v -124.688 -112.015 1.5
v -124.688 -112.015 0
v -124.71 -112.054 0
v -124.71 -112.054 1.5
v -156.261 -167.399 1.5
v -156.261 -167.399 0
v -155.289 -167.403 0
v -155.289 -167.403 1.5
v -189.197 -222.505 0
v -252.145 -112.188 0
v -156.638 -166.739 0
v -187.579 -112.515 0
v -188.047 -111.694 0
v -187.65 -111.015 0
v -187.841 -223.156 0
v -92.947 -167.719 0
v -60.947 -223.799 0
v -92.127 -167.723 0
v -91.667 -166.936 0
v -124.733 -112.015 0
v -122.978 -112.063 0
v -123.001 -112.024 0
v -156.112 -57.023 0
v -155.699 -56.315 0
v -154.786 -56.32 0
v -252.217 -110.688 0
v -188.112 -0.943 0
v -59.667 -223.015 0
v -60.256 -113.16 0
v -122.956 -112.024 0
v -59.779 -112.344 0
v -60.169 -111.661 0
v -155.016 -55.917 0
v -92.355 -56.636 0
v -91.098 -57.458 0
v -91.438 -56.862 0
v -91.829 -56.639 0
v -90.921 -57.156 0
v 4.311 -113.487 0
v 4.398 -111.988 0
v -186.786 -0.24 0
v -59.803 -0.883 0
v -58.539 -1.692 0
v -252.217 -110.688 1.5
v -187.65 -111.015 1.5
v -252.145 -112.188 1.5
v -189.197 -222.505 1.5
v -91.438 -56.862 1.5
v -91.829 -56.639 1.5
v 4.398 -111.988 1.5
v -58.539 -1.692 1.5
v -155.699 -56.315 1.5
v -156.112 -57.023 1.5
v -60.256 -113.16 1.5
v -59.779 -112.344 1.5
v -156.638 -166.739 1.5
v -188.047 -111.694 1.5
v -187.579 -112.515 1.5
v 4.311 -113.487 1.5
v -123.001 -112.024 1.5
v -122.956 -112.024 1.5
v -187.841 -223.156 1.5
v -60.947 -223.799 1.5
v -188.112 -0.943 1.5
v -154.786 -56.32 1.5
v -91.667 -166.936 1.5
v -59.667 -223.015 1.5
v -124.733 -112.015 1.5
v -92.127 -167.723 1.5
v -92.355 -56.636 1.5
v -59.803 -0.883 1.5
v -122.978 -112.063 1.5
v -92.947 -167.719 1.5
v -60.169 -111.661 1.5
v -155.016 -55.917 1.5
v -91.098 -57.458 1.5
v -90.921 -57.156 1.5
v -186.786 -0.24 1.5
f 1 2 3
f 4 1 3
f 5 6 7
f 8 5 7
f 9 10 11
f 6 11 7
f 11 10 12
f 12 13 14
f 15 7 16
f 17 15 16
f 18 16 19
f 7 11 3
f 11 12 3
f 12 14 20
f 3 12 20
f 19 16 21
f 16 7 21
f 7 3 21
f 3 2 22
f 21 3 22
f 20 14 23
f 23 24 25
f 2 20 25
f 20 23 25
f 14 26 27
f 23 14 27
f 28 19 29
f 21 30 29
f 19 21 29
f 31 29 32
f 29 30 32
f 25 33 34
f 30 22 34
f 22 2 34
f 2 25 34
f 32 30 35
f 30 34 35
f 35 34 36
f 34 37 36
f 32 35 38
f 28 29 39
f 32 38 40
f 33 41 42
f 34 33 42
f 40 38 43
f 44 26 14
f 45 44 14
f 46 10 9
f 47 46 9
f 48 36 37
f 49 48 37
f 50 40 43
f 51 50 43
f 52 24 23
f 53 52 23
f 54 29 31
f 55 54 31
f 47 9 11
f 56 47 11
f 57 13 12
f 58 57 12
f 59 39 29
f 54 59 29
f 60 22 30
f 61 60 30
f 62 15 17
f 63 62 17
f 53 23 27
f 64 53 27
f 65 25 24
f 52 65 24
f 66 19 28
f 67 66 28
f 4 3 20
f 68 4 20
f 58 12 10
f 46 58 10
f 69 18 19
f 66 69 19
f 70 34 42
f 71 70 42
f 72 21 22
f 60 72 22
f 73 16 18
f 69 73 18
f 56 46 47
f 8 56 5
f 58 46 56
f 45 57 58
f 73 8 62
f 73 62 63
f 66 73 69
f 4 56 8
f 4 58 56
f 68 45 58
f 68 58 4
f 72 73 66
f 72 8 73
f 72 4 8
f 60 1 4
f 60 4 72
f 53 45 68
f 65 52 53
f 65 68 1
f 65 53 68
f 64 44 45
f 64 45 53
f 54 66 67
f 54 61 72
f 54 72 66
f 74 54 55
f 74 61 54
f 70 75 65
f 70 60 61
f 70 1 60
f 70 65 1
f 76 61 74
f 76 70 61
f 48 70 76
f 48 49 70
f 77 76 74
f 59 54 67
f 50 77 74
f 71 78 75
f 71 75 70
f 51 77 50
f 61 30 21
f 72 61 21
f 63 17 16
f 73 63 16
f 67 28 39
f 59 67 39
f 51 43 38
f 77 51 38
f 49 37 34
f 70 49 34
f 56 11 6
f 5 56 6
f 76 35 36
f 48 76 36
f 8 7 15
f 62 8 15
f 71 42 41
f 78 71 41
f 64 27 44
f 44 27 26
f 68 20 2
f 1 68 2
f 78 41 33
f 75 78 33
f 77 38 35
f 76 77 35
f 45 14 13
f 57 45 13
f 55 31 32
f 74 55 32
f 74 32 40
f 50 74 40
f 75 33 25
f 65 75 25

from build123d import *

# Parameters (mm, degrees)
F1_DEPTH = 1.5


# Not quite as in the source:
# - ends of sketch curves that miss each other by under 0.0002 mm in the source are joined


with BuildPart() as f1:
    # F0 (on Top) → F1 (new body)
    with BuildSketch(Plane.XY):
        Polygon((-154.7862010079, -56.3197720771), (-155.698514, -56.31515), (-156.1119683507, -57.0229680515), (-188.1119961072, -0.943063637), (-252.2166275849, -110.6877438524), (-187.6499915883, -111.0148592346), (-188.0469170019, -111.6943803821), (-187.578521744, -112.5152405744), (-252.1451579752, -112.188125191), (-189.1969680657, -222.5045451407), (-156.6379224358, -166.7385013741), (-156.261298, -167.398534), (-155.2892116972, -167.4034589083), (-187.8405636484, -223.1563251995), (-60.9469641109, -223.7992090591), (-92.9469916323, -167.7193050566), (-92.127277, -167.723458), (-91.6671171884, -166.9356819838), (-59.667332984, -223.0151595742), (4.3105823215, -113.4874126049), (-60.2555620411, -113.1602997135), (-59.778874, -112.344228), (-60.1688938721, -111.6607195518), (4.3977421328, -111.987834934), (-58.5385800691, -1.6922148149), (-90.9212471101, -57.156163237), (-91.0976251965, -57.4582577209), (-91.4381361233, -56.861513861), (-91.8289476292, -56.638734186), (-92.3545377772, -56.6360713738), (-59.8031858283, -0.8832050865), (-186.7862285296, -0.239868074), (-155.0159777331, -55.9170894017), align=None)
        Polygon((-124.7326106109, -112.0151510591), (-124.6877867318, -112.0153781513), (-124.7103900886, -112.0540924243), align=None, mode=Mode.SUBTRACT)
        Polygon((-123.0005820296, -112.023926074), (-122.955962742, -112.0241521297), (-122.9784629293, -112.0626896976), align=None, mode=Mode.SUBTRACT)
    extrude(amount=F1_DEPTH)


solid = f1.part
